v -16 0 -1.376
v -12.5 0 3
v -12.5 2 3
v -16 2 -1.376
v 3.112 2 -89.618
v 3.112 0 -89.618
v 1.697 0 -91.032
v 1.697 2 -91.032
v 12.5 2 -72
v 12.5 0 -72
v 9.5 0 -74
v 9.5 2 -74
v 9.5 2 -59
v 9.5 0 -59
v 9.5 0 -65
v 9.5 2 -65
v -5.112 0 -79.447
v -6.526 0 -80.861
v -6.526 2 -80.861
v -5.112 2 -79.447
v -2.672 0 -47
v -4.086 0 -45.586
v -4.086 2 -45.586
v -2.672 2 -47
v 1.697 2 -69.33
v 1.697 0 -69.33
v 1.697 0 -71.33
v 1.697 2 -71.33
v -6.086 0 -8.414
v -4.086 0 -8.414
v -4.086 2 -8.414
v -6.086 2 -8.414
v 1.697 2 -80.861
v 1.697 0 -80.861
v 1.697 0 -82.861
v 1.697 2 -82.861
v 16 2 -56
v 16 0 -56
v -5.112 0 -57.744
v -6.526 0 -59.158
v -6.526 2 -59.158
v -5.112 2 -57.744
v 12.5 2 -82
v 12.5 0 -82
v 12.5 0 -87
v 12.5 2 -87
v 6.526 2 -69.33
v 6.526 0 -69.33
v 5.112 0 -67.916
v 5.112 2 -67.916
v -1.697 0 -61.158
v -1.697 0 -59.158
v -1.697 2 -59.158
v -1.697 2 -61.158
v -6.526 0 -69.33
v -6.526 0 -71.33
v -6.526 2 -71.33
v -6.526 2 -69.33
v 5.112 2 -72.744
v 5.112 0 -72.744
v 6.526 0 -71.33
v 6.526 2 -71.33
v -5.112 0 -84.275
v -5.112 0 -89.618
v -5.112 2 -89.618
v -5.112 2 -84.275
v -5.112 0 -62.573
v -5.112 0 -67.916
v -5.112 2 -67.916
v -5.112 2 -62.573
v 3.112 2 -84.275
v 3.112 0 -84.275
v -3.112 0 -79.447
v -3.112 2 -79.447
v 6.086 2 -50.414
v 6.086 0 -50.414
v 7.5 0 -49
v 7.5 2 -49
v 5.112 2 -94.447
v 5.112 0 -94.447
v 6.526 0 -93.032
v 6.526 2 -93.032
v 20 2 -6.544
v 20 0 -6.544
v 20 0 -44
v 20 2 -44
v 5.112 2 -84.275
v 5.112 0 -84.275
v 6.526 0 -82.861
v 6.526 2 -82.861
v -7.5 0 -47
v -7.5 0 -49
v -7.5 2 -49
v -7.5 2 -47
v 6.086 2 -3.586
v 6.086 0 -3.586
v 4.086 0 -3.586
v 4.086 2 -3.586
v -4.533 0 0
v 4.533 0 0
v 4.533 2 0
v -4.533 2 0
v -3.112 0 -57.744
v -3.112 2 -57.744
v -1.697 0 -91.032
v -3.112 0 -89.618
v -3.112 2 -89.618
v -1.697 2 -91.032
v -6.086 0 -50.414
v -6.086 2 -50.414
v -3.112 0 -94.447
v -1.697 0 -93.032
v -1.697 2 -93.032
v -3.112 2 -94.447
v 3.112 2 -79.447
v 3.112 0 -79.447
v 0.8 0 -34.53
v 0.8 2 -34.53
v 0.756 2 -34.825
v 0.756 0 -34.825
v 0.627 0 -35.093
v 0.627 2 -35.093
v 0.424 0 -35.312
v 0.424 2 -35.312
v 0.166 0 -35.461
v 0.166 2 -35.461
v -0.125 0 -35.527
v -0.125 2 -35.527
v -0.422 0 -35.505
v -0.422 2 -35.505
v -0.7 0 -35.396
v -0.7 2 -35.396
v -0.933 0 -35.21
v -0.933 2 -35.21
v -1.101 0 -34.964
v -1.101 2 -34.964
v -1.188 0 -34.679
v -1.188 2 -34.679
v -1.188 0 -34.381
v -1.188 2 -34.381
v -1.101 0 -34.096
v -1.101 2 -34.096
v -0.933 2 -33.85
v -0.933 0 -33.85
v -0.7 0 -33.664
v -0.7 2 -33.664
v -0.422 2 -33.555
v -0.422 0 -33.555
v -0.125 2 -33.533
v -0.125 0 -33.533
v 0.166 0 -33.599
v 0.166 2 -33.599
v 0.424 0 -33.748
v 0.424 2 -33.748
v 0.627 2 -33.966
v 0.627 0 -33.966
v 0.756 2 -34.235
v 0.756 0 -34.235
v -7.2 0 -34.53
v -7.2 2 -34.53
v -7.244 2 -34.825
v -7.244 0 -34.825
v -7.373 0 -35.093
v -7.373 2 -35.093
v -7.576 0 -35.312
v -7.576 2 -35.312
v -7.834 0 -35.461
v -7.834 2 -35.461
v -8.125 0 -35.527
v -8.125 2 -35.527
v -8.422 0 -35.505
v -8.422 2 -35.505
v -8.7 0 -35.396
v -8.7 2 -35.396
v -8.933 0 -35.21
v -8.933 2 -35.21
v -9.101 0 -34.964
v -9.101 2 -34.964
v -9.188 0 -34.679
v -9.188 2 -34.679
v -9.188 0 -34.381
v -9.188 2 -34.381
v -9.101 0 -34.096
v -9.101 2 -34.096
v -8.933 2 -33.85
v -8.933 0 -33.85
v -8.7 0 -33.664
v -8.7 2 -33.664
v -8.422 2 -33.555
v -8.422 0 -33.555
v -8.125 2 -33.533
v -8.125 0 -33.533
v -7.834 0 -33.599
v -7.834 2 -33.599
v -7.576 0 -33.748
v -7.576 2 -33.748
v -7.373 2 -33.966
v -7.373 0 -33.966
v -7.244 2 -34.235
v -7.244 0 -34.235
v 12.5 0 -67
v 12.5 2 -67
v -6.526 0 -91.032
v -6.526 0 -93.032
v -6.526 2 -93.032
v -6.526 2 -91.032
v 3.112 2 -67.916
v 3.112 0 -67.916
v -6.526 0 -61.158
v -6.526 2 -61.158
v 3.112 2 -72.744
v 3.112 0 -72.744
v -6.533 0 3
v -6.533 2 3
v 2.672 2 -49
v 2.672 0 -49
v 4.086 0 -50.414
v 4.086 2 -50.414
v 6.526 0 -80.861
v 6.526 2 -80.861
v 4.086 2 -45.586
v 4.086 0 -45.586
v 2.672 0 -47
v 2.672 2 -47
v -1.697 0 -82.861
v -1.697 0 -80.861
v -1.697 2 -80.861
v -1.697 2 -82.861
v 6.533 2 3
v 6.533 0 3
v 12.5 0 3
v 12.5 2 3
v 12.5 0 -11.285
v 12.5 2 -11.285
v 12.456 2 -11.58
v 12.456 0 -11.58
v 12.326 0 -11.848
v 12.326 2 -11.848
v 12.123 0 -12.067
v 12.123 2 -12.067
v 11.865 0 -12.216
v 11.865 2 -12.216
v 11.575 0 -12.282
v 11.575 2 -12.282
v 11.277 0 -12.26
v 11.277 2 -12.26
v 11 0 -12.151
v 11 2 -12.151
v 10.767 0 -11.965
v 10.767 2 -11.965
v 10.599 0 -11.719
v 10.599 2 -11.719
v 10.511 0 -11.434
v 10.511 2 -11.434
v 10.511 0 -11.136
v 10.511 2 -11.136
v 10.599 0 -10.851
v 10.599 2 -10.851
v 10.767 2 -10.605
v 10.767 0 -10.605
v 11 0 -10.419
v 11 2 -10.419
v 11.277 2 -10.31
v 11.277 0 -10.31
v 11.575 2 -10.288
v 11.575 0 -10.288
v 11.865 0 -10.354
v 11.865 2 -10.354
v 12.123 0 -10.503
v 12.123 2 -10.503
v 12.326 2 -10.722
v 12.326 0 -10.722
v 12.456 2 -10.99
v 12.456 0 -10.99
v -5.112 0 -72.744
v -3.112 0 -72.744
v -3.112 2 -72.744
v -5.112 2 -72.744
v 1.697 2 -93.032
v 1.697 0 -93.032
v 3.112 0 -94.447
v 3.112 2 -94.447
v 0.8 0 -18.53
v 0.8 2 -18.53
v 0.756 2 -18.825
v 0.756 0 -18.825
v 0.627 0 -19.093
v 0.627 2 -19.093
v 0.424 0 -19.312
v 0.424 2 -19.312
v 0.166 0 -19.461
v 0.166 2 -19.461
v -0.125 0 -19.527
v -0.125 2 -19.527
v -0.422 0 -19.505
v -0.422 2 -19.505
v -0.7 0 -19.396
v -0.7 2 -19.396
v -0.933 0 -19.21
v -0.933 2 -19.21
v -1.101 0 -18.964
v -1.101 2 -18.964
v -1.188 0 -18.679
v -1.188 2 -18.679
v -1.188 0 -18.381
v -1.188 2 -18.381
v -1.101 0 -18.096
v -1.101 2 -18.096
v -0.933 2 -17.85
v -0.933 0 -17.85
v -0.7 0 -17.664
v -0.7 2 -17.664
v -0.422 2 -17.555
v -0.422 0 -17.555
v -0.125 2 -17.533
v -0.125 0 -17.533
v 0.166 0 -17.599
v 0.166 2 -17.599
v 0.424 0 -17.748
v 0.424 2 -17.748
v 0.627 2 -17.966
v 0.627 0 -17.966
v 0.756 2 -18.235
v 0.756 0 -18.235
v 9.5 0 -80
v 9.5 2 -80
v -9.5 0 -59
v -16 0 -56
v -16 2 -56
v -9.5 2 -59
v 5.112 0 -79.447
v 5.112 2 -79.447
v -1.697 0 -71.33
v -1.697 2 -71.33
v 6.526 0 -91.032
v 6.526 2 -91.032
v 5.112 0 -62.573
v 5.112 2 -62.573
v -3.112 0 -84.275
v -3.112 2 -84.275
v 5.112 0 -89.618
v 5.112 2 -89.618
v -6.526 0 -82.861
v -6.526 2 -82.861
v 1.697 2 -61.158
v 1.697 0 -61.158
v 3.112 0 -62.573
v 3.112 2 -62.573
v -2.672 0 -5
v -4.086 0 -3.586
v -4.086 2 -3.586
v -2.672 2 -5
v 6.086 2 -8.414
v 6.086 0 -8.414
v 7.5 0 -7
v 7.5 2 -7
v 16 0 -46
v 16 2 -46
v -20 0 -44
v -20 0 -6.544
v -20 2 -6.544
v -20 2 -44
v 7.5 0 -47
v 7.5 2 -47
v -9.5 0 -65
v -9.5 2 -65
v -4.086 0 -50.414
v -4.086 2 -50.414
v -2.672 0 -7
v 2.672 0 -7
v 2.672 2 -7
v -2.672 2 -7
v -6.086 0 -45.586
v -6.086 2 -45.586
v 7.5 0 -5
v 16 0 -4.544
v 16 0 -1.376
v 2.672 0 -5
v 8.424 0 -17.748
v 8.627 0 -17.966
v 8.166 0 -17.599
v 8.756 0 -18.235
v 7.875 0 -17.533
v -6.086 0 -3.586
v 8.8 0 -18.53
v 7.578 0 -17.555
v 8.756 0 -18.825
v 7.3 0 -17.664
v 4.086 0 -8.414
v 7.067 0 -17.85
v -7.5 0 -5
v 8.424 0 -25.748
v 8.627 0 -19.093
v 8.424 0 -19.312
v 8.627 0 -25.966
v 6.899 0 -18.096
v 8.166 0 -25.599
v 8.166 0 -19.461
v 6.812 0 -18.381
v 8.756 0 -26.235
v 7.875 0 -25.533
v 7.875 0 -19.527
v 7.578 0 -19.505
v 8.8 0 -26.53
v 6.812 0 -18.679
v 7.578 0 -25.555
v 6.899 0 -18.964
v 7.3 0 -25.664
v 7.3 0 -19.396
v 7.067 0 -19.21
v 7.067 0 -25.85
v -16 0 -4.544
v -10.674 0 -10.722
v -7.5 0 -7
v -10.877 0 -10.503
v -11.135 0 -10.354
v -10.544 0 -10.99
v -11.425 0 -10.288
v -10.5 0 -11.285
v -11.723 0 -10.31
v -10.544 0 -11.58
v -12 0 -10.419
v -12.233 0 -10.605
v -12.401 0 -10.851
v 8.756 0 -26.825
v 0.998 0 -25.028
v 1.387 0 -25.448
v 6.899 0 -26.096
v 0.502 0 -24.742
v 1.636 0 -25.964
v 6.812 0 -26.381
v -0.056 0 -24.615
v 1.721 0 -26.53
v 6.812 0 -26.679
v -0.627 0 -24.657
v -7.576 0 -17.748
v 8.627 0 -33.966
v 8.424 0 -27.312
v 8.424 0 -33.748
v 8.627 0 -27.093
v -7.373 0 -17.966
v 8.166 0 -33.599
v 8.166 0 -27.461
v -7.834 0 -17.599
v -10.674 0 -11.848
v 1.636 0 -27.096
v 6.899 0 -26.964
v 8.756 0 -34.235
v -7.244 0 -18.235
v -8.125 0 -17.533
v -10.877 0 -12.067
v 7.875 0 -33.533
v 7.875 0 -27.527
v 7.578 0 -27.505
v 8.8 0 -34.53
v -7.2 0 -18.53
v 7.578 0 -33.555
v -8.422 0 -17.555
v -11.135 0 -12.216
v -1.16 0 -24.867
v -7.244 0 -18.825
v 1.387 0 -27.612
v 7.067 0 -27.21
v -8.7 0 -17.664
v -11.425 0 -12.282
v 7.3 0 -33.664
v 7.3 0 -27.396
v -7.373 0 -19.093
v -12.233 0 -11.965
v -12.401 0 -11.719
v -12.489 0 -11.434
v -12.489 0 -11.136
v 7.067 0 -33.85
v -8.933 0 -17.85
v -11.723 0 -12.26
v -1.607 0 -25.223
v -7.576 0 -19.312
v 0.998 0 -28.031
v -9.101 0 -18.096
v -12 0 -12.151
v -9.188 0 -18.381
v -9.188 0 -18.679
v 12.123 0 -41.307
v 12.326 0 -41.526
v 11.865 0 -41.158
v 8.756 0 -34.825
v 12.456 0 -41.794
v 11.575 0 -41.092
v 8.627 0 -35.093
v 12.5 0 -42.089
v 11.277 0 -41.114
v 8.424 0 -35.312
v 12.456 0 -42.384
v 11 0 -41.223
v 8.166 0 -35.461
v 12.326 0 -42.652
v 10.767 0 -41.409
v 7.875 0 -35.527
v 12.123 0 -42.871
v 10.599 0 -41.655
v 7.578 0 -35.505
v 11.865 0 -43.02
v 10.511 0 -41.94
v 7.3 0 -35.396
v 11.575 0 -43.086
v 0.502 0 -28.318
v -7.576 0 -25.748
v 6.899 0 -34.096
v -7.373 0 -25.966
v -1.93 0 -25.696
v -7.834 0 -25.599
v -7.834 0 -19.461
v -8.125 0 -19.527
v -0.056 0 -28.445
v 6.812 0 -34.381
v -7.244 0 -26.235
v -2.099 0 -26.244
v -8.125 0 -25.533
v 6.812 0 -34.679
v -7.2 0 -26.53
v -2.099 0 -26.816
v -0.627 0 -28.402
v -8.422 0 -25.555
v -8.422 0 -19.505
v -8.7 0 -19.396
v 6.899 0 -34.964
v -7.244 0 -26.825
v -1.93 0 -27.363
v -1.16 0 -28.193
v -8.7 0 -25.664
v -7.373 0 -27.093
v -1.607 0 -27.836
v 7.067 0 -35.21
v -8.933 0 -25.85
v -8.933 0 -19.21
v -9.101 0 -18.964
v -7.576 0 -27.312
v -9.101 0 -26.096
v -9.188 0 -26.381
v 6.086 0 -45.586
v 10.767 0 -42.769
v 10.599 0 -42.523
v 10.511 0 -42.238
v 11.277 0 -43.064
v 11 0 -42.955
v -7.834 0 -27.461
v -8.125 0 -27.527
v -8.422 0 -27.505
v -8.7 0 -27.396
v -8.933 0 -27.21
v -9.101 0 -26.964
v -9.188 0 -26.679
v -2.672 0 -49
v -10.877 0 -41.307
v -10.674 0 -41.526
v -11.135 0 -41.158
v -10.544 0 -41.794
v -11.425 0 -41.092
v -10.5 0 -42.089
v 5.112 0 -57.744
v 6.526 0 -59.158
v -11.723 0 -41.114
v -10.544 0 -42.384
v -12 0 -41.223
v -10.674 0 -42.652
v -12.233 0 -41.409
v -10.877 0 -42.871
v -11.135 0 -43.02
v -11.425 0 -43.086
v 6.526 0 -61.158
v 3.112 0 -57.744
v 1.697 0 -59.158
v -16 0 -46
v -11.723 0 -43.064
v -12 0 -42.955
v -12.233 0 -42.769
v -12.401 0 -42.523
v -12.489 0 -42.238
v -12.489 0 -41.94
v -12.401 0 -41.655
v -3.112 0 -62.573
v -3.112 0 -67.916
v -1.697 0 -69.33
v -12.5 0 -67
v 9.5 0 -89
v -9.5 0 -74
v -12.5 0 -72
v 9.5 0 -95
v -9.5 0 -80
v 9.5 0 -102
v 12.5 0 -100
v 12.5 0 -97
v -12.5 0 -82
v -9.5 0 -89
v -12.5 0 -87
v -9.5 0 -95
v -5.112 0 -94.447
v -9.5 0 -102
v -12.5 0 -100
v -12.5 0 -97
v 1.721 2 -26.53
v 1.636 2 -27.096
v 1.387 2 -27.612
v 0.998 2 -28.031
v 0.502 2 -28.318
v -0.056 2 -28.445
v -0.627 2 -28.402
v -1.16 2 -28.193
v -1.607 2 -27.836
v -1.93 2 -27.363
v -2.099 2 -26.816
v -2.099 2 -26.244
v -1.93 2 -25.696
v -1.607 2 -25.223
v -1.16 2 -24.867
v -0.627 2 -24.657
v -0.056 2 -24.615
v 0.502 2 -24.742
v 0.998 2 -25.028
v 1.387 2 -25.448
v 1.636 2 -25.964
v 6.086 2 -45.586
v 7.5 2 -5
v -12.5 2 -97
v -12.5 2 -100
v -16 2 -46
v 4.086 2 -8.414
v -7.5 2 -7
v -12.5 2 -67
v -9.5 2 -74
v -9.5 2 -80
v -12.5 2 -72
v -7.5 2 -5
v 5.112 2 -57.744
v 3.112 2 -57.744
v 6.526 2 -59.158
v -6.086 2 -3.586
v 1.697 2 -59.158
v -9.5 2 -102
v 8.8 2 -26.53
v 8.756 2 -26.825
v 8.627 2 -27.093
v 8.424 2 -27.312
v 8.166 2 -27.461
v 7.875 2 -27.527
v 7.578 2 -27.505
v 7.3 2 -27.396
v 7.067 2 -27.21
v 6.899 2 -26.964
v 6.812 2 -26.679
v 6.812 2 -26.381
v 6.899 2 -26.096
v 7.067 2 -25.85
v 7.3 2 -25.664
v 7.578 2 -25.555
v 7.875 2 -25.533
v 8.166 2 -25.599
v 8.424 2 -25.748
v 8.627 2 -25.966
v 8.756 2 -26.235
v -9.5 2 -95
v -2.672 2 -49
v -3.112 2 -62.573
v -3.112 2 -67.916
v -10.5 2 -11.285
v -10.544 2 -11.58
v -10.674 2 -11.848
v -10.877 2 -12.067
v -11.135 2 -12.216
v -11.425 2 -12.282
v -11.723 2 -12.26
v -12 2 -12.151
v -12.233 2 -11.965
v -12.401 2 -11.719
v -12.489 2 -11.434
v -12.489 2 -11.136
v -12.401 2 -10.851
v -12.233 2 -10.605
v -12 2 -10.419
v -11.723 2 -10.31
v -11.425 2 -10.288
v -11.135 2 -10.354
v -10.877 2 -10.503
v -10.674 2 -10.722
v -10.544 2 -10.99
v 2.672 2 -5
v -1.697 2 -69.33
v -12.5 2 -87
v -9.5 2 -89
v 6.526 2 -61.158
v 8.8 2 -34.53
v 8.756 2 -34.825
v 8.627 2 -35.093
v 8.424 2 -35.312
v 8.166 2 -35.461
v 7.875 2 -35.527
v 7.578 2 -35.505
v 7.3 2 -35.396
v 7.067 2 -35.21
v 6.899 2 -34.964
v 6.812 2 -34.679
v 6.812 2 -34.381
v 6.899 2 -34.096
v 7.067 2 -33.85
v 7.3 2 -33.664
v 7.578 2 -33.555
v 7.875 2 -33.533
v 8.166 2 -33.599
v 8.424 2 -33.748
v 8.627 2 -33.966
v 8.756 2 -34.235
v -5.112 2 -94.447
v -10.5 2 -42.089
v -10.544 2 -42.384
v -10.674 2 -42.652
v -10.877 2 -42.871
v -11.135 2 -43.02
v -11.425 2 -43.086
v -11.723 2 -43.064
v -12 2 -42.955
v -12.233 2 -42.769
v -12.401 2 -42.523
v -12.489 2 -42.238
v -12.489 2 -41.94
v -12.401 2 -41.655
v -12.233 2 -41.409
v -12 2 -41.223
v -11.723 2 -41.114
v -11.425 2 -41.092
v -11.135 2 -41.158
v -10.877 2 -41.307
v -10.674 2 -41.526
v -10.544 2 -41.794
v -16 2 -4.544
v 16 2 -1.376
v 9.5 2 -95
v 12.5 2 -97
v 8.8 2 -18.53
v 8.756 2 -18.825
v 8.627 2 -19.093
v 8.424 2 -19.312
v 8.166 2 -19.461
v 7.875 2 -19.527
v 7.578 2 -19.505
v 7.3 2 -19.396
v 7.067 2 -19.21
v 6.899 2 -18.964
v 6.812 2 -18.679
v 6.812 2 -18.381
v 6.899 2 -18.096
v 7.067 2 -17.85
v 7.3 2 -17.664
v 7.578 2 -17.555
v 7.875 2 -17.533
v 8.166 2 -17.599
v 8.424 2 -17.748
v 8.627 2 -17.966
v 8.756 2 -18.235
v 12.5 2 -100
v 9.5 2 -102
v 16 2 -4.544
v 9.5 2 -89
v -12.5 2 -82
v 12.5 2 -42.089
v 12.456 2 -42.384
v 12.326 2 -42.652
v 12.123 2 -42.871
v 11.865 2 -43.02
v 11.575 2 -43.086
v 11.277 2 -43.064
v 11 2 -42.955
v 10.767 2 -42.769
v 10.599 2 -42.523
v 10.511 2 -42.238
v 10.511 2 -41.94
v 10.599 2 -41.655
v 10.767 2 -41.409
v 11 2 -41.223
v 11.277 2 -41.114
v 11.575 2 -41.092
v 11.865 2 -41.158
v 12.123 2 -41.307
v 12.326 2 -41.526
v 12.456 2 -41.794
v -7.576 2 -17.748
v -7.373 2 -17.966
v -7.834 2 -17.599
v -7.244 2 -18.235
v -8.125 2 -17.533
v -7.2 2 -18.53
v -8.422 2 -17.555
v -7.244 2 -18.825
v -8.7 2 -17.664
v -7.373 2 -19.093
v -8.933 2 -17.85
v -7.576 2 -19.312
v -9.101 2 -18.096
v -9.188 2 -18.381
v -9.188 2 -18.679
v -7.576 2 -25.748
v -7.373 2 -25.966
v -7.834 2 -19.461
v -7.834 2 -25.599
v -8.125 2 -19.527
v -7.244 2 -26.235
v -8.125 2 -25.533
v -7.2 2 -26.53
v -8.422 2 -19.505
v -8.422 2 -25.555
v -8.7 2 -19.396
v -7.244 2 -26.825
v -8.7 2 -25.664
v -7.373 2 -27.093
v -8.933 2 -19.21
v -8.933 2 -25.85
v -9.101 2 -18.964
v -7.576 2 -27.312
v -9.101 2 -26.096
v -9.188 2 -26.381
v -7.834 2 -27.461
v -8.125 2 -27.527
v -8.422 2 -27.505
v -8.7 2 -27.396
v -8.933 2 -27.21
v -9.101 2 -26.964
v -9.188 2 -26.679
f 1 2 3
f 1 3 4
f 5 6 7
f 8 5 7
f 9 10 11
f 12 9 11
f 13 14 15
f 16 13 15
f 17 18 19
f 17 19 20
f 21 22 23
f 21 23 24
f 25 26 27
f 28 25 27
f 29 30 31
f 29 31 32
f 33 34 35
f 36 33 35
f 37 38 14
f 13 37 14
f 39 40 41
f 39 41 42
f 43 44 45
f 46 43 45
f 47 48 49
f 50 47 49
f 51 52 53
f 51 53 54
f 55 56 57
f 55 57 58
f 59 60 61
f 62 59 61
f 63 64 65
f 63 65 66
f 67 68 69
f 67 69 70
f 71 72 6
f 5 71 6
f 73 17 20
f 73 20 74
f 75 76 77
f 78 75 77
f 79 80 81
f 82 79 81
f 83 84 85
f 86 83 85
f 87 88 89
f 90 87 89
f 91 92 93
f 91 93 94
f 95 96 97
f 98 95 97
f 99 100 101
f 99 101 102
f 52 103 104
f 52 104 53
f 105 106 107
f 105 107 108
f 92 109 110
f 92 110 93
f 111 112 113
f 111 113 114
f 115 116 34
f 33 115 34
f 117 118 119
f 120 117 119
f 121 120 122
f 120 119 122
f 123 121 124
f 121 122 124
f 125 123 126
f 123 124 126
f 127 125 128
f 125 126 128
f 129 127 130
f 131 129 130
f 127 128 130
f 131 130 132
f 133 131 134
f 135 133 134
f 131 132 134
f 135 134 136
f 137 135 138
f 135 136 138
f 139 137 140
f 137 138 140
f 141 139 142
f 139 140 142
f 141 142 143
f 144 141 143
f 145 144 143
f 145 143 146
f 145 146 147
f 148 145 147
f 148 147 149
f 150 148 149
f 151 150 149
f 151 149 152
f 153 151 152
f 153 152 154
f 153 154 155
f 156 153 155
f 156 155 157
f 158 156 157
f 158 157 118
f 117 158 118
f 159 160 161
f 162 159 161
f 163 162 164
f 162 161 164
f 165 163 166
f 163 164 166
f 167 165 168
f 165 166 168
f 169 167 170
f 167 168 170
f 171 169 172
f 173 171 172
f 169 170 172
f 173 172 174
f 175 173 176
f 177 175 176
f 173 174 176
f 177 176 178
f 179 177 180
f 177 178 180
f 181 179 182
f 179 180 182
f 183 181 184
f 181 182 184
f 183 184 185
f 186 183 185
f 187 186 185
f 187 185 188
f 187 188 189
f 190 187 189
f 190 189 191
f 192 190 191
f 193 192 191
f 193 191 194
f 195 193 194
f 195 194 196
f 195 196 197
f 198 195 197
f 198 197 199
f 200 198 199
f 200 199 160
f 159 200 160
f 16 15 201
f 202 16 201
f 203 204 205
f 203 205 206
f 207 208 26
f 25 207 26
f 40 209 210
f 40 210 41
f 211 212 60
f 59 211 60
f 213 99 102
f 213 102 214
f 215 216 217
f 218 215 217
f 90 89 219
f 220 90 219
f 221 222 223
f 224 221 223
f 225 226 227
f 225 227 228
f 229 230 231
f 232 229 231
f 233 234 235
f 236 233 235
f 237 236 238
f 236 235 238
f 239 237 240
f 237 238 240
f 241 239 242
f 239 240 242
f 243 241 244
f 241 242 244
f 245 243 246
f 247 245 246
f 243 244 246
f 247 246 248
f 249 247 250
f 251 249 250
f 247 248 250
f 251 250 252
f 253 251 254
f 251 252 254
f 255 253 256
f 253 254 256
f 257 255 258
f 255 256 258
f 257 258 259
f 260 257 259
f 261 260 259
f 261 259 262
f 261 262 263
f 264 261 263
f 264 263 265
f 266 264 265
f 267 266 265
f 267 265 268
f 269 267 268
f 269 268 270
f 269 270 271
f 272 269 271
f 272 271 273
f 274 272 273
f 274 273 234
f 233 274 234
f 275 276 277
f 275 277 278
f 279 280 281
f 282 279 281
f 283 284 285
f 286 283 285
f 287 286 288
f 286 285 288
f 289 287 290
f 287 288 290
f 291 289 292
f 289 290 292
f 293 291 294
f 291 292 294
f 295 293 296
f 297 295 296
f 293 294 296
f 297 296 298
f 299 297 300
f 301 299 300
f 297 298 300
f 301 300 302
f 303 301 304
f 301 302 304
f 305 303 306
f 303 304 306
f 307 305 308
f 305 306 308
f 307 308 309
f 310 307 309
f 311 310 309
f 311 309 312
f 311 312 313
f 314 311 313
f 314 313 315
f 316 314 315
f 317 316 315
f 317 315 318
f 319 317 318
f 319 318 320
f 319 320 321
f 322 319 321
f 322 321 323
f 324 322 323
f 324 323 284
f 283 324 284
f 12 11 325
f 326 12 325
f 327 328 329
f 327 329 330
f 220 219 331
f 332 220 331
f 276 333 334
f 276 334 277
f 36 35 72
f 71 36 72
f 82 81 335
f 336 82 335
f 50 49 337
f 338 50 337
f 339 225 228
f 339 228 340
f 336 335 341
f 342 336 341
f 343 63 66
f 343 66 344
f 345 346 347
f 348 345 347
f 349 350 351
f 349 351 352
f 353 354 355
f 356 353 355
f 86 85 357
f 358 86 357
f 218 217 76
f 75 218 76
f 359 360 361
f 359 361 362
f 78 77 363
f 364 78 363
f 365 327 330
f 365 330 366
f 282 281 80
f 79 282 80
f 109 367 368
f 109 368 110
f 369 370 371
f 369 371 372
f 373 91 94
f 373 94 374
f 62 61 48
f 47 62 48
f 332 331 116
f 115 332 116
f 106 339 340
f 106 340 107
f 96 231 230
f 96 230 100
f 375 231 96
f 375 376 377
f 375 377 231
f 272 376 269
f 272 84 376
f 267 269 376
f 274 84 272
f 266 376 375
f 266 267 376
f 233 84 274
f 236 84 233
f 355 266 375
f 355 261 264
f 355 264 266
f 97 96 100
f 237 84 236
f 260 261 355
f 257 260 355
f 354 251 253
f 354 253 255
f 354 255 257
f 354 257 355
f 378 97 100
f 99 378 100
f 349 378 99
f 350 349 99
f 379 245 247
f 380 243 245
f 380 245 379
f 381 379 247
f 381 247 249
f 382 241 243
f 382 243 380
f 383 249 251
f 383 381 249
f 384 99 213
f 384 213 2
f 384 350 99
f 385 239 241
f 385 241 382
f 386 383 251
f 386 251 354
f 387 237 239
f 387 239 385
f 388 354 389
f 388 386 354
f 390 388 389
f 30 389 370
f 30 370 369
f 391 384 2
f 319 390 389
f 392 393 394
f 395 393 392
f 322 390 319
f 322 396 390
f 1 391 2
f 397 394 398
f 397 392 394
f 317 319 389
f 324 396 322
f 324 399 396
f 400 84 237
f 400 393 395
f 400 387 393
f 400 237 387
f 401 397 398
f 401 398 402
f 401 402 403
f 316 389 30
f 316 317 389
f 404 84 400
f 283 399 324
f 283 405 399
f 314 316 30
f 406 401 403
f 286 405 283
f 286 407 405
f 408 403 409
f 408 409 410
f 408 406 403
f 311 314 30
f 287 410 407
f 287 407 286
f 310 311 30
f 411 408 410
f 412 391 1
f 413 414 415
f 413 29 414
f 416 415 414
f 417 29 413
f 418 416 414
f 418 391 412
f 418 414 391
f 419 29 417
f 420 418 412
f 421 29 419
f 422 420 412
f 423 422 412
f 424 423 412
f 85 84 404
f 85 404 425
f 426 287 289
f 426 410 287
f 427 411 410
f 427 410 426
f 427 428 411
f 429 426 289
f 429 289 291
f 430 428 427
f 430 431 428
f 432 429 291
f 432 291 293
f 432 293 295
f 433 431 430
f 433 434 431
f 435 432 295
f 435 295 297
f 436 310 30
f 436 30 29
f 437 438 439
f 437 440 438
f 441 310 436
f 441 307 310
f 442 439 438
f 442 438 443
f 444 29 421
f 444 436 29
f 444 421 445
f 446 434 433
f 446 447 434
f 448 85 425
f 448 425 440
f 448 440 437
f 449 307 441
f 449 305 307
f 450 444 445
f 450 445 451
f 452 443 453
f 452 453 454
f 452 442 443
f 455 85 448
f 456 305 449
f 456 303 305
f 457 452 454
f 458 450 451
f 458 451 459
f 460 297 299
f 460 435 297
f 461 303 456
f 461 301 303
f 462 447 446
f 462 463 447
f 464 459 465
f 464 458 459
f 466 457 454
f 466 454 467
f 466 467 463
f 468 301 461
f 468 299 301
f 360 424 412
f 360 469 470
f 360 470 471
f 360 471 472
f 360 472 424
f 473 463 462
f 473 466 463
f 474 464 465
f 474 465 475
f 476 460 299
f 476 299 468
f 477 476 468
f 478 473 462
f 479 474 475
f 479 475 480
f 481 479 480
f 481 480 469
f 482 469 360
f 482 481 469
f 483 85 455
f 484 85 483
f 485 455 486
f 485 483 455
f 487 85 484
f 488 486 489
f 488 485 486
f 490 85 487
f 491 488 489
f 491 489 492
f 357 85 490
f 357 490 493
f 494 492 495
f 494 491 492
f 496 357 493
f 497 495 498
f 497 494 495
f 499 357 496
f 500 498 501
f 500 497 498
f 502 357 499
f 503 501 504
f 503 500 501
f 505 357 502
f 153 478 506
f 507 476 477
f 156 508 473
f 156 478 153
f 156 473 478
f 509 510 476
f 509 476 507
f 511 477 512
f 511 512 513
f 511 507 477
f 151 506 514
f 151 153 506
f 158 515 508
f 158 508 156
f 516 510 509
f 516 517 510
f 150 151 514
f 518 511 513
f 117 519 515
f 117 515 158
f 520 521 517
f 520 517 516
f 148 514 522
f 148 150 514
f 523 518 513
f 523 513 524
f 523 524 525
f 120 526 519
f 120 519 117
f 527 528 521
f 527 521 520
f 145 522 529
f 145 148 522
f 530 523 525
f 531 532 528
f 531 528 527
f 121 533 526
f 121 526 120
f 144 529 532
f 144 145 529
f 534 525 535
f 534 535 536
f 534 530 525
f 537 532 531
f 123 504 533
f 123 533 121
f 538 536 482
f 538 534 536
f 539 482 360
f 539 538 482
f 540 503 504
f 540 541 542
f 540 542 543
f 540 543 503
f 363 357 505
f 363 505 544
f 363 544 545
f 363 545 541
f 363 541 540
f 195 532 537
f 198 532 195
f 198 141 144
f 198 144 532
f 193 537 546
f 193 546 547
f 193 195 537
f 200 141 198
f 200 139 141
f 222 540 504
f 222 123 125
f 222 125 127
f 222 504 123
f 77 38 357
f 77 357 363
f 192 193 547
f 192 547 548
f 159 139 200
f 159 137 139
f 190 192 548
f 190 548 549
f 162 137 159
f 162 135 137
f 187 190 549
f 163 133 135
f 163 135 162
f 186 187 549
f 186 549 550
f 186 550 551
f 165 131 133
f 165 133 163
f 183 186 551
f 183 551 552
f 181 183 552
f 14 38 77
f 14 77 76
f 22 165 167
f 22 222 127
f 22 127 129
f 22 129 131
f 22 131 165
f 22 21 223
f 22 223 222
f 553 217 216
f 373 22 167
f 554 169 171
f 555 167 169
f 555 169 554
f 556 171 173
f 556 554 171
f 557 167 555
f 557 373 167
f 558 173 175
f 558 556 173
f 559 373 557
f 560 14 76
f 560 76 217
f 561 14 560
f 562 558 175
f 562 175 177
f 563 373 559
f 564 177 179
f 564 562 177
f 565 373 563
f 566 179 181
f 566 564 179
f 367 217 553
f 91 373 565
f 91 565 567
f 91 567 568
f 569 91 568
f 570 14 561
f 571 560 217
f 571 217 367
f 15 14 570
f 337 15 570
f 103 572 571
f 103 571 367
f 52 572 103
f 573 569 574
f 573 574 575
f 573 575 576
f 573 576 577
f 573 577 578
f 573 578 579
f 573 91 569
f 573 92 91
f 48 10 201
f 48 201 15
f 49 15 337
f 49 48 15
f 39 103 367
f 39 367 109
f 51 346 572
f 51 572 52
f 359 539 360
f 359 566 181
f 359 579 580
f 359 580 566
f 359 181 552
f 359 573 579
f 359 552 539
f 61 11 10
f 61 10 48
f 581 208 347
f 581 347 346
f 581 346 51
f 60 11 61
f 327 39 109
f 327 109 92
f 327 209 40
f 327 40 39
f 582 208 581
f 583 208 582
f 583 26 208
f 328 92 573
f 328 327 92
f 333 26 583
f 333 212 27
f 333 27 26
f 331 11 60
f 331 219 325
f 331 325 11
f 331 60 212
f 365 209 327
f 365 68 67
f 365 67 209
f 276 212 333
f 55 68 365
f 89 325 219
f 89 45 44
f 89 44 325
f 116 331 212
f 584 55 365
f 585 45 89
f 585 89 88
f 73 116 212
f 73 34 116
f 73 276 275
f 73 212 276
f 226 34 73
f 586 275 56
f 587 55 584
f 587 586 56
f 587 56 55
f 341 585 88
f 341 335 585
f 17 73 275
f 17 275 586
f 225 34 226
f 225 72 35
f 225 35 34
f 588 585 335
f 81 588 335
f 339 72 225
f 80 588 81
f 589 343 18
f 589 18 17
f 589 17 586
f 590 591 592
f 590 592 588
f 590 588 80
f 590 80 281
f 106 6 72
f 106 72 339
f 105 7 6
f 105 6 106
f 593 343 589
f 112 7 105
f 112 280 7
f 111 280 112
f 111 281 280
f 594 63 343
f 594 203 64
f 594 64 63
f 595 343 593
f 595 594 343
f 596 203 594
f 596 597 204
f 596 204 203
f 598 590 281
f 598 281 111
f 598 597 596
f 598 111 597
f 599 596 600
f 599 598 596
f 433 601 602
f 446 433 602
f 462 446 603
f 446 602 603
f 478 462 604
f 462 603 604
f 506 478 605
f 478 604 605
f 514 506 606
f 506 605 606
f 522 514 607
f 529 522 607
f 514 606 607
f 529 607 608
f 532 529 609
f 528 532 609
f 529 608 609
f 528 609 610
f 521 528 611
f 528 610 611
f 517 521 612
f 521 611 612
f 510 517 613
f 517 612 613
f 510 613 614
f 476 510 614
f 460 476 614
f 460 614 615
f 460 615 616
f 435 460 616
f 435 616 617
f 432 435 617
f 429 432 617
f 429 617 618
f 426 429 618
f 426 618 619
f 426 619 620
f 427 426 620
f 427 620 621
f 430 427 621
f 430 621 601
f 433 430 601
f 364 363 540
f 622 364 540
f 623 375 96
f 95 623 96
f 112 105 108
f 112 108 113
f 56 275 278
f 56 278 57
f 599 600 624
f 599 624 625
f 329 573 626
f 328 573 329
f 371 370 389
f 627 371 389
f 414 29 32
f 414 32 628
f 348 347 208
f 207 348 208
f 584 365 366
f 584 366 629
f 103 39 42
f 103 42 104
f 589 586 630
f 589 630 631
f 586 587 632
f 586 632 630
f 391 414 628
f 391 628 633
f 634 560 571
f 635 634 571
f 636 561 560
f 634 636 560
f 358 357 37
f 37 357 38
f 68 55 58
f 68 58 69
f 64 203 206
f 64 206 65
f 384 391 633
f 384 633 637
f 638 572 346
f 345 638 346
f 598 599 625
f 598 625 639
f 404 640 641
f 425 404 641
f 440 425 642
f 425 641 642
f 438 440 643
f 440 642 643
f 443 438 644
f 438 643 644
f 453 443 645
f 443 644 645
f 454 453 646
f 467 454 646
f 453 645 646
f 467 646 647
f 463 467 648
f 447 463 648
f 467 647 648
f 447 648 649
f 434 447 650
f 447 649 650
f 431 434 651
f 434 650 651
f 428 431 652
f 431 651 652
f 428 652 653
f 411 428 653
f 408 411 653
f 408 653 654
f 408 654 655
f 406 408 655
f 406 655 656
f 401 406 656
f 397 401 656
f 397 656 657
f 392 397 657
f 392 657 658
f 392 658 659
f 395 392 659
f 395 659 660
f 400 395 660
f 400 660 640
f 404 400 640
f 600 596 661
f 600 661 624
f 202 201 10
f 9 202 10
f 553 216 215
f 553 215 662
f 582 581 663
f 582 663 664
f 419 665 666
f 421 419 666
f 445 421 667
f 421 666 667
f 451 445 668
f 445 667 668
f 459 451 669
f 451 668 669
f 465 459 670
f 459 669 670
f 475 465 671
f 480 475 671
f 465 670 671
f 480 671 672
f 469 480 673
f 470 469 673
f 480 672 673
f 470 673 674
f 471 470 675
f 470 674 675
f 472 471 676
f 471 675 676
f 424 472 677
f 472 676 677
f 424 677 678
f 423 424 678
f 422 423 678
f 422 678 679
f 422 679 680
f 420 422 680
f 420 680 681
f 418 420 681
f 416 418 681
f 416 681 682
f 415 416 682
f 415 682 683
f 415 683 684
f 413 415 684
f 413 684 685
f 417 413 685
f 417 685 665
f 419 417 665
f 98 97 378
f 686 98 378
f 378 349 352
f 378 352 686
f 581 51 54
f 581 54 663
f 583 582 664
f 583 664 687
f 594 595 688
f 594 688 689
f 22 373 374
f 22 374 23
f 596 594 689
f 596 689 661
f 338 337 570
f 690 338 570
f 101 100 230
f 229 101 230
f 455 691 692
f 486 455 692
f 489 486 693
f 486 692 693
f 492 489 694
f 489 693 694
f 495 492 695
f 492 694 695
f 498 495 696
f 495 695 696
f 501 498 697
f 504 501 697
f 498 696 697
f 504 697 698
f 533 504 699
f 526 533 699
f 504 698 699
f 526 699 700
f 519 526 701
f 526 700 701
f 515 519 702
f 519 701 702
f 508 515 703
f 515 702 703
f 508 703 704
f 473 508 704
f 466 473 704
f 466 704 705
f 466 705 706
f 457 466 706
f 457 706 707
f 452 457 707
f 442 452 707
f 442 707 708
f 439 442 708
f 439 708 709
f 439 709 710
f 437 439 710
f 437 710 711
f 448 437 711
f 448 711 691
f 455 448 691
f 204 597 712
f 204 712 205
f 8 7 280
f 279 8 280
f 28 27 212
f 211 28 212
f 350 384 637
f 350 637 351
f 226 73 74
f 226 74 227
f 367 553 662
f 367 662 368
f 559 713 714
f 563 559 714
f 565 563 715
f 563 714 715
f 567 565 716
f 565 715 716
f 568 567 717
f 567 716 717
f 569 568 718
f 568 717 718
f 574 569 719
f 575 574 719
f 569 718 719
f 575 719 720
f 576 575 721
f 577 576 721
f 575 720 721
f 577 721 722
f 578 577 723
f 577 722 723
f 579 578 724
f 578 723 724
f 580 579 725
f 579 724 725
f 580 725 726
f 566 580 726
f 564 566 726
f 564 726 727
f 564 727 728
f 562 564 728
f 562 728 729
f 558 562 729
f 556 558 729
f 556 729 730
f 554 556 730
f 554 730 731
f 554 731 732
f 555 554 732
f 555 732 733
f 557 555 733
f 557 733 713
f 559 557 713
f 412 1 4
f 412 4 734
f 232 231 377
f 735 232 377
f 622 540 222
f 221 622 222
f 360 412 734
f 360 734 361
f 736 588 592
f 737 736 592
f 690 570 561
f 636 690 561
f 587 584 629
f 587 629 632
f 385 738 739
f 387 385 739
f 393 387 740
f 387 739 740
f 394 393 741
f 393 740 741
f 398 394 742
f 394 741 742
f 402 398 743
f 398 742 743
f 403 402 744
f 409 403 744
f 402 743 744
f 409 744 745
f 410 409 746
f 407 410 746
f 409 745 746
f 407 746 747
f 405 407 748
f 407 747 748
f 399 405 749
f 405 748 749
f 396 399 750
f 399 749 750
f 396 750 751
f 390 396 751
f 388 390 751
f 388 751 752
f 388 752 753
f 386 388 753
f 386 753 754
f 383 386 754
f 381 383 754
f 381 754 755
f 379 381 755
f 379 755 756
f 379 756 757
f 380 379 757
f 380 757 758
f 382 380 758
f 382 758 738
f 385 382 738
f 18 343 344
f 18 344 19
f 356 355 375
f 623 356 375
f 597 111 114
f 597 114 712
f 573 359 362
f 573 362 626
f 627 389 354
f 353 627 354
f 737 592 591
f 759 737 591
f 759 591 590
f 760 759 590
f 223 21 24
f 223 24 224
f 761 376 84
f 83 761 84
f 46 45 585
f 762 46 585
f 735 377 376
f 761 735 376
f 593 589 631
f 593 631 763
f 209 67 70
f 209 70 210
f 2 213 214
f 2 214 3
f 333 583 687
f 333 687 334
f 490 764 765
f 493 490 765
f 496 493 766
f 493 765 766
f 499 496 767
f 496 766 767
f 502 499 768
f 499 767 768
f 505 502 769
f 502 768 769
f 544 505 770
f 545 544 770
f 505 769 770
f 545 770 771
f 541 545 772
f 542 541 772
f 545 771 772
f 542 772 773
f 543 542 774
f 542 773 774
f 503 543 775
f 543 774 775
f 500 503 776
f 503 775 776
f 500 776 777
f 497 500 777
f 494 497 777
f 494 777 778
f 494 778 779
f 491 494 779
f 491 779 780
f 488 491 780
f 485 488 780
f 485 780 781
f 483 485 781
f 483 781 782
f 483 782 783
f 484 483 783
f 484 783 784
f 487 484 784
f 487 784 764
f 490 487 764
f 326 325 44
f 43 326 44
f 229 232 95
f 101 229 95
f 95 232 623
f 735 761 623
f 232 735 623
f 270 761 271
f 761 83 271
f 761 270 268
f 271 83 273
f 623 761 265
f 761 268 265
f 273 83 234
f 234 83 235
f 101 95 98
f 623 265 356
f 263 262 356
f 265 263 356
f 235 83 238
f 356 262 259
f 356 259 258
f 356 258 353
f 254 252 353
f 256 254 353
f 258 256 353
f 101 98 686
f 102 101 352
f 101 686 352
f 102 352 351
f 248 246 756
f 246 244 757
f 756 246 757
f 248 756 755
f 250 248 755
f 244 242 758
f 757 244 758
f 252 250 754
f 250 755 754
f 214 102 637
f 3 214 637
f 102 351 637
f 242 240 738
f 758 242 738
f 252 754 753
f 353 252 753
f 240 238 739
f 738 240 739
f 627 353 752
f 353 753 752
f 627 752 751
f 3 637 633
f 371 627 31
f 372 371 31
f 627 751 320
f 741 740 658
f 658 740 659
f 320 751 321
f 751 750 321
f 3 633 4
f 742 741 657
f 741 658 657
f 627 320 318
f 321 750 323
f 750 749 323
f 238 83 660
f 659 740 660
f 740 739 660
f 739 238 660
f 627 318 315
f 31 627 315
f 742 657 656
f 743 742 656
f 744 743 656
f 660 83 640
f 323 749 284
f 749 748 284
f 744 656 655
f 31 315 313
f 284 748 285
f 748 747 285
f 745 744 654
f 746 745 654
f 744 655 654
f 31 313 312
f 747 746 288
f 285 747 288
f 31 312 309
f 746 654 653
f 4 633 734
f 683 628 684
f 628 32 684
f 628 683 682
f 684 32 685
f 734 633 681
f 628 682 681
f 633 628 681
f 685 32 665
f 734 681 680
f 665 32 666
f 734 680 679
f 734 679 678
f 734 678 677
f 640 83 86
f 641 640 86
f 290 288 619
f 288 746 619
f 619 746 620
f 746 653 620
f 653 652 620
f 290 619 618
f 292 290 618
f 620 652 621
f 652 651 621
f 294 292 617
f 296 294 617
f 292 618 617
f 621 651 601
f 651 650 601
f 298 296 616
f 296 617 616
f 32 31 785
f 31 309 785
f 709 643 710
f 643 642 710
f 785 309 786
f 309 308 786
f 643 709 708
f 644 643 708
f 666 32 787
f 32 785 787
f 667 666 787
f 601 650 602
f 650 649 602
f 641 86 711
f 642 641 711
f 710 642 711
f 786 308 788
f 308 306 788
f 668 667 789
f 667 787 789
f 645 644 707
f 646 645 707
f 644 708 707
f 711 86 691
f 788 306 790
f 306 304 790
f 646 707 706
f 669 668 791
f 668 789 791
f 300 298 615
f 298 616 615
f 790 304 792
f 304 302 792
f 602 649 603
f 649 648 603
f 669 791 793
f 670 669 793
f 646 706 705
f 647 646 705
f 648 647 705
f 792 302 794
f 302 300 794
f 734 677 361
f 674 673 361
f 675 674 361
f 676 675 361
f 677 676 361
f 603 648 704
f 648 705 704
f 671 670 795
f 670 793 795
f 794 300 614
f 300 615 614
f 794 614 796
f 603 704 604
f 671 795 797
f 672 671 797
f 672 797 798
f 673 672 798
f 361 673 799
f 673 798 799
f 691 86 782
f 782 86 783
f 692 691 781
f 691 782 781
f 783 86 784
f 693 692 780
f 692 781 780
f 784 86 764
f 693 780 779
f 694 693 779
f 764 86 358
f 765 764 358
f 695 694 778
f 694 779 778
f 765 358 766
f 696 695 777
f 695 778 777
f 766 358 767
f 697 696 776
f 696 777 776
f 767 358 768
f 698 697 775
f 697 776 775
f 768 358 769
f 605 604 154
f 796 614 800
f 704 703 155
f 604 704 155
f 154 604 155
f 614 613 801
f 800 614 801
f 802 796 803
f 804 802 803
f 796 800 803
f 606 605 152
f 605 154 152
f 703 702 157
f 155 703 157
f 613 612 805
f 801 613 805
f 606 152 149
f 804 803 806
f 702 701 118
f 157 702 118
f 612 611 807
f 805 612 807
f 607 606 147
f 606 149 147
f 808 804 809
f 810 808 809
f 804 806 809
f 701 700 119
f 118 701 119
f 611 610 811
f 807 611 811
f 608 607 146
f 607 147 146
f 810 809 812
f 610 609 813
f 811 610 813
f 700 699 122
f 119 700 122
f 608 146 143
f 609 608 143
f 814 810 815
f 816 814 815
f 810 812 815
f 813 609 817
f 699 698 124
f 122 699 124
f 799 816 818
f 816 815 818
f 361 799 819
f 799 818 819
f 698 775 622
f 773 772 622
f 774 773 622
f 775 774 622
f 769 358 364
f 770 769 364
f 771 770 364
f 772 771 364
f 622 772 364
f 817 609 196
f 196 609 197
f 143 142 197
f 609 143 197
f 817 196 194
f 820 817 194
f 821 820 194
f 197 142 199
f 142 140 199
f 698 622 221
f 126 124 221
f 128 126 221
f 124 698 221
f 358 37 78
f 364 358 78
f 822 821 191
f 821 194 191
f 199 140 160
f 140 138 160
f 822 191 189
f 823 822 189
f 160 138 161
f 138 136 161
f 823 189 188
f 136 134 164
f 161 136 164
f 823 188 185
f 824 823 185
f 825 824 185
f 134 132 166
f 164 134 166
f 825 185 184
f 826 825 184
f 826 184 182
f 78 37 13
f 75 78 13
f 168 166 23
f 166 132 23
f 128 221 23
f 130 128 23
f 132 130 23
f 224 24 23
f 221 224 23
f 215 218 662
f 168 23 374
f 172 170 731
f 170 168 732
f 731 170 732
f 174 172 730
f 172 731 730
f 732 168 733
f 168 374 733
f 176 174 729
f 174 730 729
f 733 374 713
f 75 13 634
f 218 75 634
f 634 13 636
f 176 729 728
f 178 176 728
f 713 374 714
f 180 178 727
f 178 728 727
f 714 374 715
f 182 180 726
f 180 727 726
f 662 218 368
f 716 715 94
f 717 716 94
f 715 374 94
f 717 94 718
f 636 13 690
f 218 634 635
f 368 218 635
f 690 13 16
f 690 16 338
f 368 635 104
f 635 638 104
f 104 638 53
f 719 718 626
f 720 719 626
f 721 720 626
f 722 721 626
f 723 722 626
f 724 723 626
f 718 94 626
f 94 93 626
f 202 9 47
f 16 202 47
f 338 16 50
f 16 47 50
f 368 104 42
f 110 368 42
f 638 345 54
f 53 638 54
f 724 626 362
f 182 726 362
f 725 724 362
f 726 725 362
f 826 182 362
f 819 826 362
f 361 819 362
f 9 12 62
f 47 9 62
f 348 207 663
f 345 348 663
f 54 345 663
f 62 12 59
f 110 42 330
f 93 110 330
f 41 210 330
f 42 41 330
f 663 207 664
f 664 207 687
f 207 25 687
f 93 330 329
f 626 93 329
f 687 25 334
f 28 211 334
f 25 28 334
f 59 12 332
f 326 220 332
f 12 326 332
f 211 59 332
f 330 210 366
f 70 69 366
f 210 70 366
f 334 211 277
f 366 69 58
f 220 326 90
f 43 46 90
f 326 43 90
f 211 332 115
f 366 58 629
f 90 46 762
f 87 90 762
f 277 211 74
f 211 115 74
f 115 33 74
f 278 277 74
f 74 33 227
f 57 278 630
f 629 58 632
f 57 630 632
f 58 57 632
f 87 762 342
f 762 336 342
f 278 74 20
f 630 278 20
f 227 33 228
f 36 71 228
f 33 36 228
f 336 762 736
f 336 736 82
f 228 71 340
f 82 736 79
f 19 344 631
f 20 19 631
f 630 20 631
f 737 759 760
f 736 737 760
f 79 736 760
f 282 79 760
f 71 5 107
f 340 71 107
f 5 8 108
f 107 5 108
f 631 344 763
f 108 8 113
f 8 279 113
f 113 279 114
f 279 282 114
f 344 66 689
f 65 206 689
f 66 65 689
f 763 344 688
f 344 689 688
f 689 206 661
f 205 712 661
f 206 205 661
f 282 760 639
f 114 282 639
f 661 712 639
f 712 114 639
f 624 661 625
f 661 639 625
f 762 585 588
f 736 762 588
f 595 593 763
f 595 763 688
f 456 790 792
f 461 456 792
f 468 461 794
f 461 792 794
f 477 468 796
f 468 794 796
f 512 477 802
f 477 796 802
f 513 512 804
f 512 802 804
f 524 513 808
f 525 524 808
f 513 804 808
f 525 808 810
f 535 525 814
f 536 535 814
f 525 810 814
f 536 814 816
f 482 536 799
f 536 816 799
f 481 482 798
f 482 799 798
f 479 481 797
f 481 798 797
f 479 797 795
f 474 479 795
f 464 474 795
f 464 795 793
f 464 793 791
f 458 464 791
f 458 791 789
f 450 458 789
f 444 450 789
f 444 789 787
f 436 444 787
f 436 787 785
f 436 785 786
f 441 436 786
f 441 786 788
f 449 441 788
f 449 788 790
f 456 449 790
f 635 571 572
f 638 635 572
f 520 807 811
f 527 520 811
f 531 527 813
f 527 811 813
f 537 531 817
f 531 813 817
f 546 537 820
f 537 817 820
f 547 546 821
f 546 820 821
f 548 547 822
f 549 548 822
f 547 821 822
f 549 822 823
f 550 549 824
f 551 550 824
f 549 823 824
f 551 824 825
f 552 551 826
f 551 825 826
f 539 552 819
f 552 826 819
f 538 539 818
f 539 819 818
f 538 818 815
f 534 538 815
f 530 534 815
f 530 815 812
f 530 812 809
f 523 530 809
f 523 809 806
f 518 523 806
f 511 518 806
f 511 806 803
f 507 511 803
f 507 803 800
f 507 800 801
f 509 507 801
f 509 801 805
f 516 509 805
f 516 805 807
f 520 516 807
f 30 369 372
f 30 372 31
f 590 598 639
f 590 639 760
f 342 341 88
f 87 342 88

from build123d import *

# Parameters (mm, degrees)
BOSS_EXTRUDE1_DEPTH = 2
SKETCH2_R           = 1.92051595
SKETCH2_R_2         = 1
CUT_EXTRUDE1_DEPTH  = 10


with BuildPart() as part:
    # Sketch1 → Boss-Extrude1 (new body)
    with BuildSketch(Plane(origin=(0, 0, 0), x_dir=(1, 0, 0), z_dir=(0, 1, 0))):
        Polygon((0, 0), (4.532648702, 0), (6.532648702, -3), (12.5, -3), (16, 1.375958147), (16, 4.543860935), (20, 6.543860935), (20, 44), (16, 46), (16, 56), (9.5, 59), (9.5, 65), (12.5, 67), (12.5, 72), (9.5, 74), (9.5, 80), (12.5, 82), (12.5, 87), (9.5, 89), (9.5, 95), (12.5, 97), (12.5, 100), (9.5, 102), (0, 102), (0, 49), (2.671572875, 49), (4.085786438, 50.414213562), (6.085786438, 50.414213562), (7.5, 49), (7.5, 47), (6.085786438, 45.585786438), (4.085786438, 45.585786438), (2.671572875, 47), (0, 47), (0, 7), (2.671572875, 7), (4.085786438, 8.414213562), (6.085786438, 8.414213562), (7.5, 7), (7.5, 5), (6.085786438, 3.585786438), (4.085786438, 3.585786438), (2.671572875, 5), (0, 5), align=None)
        Polygon((3.111649133, 94.44670143), (5.111649133, 94.44670143), (6.525862696, 93.032487868), (6.525862696, 91.032487868), (5.111649133, 89.618274306), (5.111649133, 84.275128555), (6.525862696, 82.860914993), (6.525862696, 80.860914993), (5.111649133, 79.44670143), (3.111649133, 79.44670143), (1.697435571, 80.860914993), (1.697435571, 82.860914993), (3.111649133, 84.275128555), (3.111649133, 89.618274306), (1.697435571, 91.032487868), (1.697435571, 93.032487868), align=None, mode=Mode.SUBTRACT)
        Polygon((3.111649133, 72.74417146), (5.111649133, 72.74417146), (6.525862696, 71.329957898), (6.525862696, 69.329957898), (5.111649133, 67.915744336), (5.111649133, 62.572598585), (6.525862696, 61.158385023), (6.525862696, 59.158385023), (5.111649133, 57.74417146), (3.111649133, 57.74417146), (1.697435571, 59.158385023), (1.697435571, 61.158385023), (3.111649133, 62.572598585), (3.111649133, 67.915744336), (1.697435571, 69.329957898), (1.697435571, 71.329957898), align=None, mode=Mode.SUBTRACT)
    boss_extrude1 = extrude(amount=BOSS_EXTRUDE1_DEPTH)

    # Mirror1: Boss-Extrude1 across plane
    add(boss_extrude1.mirror(Plane(origin=(0, 0, 0), x_dir=(0, 0, 1), z_dir=(1, 0, 0))))

    # Sketch2 → Cut-Extrude1 (cut)
    with BuildSketch(Plane(origin=(0, 2, 0), x_dir=(1, 0, 0), z_dir=(0, 1, 0))):
        with Locations((-0.199550917, 26.529752726)):
            Circle(SKETCH2_R)
        with Locations((-8.199550917, 34.529752726)):
            Circle(SKETCH2_R_2)
        with Locations((-0.199550917, 34.529752726)):
            Circle(SKETCH2_R_2)
        with Locations((7.800449083, 34.529752726)):
            Circle(SKETCH2_R_2)
        with Locations((7.800449083, 26.529752726)):
            Circle(SKETCH2_R_2)
        with Locations((7.800449083, 18.529752726)):
            Circle(SKETCH2_R_2)
        with Locations((-0.199550917, 18.529752726)):
            Circle(SKETCH2_R_2)
        with Locations((-8.199550917, 18.529752726)):
            Circle(SKETCH2_R_2)
        with Locations((-8.199550917, 26.529752726)):
            Circle(SKETCH2_R_2)
        with Locations((-11.5, 42.089017941)):
            Circle(SKETCH2_R_2)
        with Locations((11.5, 42.089017941)):
            Circle(SKETCH2_R_2)
        with Locations((11.5, 11.285069421)):
            Circle(SKETCH2_R_2)
        with Locations((-11.5, 11.285069421)):
            Circle(SKETCH2_R_2)
    extrude(amount=-CUT_EXTRUDE1_DEPTH, mode=Mode.SUBTRACT)


solid = part.part
